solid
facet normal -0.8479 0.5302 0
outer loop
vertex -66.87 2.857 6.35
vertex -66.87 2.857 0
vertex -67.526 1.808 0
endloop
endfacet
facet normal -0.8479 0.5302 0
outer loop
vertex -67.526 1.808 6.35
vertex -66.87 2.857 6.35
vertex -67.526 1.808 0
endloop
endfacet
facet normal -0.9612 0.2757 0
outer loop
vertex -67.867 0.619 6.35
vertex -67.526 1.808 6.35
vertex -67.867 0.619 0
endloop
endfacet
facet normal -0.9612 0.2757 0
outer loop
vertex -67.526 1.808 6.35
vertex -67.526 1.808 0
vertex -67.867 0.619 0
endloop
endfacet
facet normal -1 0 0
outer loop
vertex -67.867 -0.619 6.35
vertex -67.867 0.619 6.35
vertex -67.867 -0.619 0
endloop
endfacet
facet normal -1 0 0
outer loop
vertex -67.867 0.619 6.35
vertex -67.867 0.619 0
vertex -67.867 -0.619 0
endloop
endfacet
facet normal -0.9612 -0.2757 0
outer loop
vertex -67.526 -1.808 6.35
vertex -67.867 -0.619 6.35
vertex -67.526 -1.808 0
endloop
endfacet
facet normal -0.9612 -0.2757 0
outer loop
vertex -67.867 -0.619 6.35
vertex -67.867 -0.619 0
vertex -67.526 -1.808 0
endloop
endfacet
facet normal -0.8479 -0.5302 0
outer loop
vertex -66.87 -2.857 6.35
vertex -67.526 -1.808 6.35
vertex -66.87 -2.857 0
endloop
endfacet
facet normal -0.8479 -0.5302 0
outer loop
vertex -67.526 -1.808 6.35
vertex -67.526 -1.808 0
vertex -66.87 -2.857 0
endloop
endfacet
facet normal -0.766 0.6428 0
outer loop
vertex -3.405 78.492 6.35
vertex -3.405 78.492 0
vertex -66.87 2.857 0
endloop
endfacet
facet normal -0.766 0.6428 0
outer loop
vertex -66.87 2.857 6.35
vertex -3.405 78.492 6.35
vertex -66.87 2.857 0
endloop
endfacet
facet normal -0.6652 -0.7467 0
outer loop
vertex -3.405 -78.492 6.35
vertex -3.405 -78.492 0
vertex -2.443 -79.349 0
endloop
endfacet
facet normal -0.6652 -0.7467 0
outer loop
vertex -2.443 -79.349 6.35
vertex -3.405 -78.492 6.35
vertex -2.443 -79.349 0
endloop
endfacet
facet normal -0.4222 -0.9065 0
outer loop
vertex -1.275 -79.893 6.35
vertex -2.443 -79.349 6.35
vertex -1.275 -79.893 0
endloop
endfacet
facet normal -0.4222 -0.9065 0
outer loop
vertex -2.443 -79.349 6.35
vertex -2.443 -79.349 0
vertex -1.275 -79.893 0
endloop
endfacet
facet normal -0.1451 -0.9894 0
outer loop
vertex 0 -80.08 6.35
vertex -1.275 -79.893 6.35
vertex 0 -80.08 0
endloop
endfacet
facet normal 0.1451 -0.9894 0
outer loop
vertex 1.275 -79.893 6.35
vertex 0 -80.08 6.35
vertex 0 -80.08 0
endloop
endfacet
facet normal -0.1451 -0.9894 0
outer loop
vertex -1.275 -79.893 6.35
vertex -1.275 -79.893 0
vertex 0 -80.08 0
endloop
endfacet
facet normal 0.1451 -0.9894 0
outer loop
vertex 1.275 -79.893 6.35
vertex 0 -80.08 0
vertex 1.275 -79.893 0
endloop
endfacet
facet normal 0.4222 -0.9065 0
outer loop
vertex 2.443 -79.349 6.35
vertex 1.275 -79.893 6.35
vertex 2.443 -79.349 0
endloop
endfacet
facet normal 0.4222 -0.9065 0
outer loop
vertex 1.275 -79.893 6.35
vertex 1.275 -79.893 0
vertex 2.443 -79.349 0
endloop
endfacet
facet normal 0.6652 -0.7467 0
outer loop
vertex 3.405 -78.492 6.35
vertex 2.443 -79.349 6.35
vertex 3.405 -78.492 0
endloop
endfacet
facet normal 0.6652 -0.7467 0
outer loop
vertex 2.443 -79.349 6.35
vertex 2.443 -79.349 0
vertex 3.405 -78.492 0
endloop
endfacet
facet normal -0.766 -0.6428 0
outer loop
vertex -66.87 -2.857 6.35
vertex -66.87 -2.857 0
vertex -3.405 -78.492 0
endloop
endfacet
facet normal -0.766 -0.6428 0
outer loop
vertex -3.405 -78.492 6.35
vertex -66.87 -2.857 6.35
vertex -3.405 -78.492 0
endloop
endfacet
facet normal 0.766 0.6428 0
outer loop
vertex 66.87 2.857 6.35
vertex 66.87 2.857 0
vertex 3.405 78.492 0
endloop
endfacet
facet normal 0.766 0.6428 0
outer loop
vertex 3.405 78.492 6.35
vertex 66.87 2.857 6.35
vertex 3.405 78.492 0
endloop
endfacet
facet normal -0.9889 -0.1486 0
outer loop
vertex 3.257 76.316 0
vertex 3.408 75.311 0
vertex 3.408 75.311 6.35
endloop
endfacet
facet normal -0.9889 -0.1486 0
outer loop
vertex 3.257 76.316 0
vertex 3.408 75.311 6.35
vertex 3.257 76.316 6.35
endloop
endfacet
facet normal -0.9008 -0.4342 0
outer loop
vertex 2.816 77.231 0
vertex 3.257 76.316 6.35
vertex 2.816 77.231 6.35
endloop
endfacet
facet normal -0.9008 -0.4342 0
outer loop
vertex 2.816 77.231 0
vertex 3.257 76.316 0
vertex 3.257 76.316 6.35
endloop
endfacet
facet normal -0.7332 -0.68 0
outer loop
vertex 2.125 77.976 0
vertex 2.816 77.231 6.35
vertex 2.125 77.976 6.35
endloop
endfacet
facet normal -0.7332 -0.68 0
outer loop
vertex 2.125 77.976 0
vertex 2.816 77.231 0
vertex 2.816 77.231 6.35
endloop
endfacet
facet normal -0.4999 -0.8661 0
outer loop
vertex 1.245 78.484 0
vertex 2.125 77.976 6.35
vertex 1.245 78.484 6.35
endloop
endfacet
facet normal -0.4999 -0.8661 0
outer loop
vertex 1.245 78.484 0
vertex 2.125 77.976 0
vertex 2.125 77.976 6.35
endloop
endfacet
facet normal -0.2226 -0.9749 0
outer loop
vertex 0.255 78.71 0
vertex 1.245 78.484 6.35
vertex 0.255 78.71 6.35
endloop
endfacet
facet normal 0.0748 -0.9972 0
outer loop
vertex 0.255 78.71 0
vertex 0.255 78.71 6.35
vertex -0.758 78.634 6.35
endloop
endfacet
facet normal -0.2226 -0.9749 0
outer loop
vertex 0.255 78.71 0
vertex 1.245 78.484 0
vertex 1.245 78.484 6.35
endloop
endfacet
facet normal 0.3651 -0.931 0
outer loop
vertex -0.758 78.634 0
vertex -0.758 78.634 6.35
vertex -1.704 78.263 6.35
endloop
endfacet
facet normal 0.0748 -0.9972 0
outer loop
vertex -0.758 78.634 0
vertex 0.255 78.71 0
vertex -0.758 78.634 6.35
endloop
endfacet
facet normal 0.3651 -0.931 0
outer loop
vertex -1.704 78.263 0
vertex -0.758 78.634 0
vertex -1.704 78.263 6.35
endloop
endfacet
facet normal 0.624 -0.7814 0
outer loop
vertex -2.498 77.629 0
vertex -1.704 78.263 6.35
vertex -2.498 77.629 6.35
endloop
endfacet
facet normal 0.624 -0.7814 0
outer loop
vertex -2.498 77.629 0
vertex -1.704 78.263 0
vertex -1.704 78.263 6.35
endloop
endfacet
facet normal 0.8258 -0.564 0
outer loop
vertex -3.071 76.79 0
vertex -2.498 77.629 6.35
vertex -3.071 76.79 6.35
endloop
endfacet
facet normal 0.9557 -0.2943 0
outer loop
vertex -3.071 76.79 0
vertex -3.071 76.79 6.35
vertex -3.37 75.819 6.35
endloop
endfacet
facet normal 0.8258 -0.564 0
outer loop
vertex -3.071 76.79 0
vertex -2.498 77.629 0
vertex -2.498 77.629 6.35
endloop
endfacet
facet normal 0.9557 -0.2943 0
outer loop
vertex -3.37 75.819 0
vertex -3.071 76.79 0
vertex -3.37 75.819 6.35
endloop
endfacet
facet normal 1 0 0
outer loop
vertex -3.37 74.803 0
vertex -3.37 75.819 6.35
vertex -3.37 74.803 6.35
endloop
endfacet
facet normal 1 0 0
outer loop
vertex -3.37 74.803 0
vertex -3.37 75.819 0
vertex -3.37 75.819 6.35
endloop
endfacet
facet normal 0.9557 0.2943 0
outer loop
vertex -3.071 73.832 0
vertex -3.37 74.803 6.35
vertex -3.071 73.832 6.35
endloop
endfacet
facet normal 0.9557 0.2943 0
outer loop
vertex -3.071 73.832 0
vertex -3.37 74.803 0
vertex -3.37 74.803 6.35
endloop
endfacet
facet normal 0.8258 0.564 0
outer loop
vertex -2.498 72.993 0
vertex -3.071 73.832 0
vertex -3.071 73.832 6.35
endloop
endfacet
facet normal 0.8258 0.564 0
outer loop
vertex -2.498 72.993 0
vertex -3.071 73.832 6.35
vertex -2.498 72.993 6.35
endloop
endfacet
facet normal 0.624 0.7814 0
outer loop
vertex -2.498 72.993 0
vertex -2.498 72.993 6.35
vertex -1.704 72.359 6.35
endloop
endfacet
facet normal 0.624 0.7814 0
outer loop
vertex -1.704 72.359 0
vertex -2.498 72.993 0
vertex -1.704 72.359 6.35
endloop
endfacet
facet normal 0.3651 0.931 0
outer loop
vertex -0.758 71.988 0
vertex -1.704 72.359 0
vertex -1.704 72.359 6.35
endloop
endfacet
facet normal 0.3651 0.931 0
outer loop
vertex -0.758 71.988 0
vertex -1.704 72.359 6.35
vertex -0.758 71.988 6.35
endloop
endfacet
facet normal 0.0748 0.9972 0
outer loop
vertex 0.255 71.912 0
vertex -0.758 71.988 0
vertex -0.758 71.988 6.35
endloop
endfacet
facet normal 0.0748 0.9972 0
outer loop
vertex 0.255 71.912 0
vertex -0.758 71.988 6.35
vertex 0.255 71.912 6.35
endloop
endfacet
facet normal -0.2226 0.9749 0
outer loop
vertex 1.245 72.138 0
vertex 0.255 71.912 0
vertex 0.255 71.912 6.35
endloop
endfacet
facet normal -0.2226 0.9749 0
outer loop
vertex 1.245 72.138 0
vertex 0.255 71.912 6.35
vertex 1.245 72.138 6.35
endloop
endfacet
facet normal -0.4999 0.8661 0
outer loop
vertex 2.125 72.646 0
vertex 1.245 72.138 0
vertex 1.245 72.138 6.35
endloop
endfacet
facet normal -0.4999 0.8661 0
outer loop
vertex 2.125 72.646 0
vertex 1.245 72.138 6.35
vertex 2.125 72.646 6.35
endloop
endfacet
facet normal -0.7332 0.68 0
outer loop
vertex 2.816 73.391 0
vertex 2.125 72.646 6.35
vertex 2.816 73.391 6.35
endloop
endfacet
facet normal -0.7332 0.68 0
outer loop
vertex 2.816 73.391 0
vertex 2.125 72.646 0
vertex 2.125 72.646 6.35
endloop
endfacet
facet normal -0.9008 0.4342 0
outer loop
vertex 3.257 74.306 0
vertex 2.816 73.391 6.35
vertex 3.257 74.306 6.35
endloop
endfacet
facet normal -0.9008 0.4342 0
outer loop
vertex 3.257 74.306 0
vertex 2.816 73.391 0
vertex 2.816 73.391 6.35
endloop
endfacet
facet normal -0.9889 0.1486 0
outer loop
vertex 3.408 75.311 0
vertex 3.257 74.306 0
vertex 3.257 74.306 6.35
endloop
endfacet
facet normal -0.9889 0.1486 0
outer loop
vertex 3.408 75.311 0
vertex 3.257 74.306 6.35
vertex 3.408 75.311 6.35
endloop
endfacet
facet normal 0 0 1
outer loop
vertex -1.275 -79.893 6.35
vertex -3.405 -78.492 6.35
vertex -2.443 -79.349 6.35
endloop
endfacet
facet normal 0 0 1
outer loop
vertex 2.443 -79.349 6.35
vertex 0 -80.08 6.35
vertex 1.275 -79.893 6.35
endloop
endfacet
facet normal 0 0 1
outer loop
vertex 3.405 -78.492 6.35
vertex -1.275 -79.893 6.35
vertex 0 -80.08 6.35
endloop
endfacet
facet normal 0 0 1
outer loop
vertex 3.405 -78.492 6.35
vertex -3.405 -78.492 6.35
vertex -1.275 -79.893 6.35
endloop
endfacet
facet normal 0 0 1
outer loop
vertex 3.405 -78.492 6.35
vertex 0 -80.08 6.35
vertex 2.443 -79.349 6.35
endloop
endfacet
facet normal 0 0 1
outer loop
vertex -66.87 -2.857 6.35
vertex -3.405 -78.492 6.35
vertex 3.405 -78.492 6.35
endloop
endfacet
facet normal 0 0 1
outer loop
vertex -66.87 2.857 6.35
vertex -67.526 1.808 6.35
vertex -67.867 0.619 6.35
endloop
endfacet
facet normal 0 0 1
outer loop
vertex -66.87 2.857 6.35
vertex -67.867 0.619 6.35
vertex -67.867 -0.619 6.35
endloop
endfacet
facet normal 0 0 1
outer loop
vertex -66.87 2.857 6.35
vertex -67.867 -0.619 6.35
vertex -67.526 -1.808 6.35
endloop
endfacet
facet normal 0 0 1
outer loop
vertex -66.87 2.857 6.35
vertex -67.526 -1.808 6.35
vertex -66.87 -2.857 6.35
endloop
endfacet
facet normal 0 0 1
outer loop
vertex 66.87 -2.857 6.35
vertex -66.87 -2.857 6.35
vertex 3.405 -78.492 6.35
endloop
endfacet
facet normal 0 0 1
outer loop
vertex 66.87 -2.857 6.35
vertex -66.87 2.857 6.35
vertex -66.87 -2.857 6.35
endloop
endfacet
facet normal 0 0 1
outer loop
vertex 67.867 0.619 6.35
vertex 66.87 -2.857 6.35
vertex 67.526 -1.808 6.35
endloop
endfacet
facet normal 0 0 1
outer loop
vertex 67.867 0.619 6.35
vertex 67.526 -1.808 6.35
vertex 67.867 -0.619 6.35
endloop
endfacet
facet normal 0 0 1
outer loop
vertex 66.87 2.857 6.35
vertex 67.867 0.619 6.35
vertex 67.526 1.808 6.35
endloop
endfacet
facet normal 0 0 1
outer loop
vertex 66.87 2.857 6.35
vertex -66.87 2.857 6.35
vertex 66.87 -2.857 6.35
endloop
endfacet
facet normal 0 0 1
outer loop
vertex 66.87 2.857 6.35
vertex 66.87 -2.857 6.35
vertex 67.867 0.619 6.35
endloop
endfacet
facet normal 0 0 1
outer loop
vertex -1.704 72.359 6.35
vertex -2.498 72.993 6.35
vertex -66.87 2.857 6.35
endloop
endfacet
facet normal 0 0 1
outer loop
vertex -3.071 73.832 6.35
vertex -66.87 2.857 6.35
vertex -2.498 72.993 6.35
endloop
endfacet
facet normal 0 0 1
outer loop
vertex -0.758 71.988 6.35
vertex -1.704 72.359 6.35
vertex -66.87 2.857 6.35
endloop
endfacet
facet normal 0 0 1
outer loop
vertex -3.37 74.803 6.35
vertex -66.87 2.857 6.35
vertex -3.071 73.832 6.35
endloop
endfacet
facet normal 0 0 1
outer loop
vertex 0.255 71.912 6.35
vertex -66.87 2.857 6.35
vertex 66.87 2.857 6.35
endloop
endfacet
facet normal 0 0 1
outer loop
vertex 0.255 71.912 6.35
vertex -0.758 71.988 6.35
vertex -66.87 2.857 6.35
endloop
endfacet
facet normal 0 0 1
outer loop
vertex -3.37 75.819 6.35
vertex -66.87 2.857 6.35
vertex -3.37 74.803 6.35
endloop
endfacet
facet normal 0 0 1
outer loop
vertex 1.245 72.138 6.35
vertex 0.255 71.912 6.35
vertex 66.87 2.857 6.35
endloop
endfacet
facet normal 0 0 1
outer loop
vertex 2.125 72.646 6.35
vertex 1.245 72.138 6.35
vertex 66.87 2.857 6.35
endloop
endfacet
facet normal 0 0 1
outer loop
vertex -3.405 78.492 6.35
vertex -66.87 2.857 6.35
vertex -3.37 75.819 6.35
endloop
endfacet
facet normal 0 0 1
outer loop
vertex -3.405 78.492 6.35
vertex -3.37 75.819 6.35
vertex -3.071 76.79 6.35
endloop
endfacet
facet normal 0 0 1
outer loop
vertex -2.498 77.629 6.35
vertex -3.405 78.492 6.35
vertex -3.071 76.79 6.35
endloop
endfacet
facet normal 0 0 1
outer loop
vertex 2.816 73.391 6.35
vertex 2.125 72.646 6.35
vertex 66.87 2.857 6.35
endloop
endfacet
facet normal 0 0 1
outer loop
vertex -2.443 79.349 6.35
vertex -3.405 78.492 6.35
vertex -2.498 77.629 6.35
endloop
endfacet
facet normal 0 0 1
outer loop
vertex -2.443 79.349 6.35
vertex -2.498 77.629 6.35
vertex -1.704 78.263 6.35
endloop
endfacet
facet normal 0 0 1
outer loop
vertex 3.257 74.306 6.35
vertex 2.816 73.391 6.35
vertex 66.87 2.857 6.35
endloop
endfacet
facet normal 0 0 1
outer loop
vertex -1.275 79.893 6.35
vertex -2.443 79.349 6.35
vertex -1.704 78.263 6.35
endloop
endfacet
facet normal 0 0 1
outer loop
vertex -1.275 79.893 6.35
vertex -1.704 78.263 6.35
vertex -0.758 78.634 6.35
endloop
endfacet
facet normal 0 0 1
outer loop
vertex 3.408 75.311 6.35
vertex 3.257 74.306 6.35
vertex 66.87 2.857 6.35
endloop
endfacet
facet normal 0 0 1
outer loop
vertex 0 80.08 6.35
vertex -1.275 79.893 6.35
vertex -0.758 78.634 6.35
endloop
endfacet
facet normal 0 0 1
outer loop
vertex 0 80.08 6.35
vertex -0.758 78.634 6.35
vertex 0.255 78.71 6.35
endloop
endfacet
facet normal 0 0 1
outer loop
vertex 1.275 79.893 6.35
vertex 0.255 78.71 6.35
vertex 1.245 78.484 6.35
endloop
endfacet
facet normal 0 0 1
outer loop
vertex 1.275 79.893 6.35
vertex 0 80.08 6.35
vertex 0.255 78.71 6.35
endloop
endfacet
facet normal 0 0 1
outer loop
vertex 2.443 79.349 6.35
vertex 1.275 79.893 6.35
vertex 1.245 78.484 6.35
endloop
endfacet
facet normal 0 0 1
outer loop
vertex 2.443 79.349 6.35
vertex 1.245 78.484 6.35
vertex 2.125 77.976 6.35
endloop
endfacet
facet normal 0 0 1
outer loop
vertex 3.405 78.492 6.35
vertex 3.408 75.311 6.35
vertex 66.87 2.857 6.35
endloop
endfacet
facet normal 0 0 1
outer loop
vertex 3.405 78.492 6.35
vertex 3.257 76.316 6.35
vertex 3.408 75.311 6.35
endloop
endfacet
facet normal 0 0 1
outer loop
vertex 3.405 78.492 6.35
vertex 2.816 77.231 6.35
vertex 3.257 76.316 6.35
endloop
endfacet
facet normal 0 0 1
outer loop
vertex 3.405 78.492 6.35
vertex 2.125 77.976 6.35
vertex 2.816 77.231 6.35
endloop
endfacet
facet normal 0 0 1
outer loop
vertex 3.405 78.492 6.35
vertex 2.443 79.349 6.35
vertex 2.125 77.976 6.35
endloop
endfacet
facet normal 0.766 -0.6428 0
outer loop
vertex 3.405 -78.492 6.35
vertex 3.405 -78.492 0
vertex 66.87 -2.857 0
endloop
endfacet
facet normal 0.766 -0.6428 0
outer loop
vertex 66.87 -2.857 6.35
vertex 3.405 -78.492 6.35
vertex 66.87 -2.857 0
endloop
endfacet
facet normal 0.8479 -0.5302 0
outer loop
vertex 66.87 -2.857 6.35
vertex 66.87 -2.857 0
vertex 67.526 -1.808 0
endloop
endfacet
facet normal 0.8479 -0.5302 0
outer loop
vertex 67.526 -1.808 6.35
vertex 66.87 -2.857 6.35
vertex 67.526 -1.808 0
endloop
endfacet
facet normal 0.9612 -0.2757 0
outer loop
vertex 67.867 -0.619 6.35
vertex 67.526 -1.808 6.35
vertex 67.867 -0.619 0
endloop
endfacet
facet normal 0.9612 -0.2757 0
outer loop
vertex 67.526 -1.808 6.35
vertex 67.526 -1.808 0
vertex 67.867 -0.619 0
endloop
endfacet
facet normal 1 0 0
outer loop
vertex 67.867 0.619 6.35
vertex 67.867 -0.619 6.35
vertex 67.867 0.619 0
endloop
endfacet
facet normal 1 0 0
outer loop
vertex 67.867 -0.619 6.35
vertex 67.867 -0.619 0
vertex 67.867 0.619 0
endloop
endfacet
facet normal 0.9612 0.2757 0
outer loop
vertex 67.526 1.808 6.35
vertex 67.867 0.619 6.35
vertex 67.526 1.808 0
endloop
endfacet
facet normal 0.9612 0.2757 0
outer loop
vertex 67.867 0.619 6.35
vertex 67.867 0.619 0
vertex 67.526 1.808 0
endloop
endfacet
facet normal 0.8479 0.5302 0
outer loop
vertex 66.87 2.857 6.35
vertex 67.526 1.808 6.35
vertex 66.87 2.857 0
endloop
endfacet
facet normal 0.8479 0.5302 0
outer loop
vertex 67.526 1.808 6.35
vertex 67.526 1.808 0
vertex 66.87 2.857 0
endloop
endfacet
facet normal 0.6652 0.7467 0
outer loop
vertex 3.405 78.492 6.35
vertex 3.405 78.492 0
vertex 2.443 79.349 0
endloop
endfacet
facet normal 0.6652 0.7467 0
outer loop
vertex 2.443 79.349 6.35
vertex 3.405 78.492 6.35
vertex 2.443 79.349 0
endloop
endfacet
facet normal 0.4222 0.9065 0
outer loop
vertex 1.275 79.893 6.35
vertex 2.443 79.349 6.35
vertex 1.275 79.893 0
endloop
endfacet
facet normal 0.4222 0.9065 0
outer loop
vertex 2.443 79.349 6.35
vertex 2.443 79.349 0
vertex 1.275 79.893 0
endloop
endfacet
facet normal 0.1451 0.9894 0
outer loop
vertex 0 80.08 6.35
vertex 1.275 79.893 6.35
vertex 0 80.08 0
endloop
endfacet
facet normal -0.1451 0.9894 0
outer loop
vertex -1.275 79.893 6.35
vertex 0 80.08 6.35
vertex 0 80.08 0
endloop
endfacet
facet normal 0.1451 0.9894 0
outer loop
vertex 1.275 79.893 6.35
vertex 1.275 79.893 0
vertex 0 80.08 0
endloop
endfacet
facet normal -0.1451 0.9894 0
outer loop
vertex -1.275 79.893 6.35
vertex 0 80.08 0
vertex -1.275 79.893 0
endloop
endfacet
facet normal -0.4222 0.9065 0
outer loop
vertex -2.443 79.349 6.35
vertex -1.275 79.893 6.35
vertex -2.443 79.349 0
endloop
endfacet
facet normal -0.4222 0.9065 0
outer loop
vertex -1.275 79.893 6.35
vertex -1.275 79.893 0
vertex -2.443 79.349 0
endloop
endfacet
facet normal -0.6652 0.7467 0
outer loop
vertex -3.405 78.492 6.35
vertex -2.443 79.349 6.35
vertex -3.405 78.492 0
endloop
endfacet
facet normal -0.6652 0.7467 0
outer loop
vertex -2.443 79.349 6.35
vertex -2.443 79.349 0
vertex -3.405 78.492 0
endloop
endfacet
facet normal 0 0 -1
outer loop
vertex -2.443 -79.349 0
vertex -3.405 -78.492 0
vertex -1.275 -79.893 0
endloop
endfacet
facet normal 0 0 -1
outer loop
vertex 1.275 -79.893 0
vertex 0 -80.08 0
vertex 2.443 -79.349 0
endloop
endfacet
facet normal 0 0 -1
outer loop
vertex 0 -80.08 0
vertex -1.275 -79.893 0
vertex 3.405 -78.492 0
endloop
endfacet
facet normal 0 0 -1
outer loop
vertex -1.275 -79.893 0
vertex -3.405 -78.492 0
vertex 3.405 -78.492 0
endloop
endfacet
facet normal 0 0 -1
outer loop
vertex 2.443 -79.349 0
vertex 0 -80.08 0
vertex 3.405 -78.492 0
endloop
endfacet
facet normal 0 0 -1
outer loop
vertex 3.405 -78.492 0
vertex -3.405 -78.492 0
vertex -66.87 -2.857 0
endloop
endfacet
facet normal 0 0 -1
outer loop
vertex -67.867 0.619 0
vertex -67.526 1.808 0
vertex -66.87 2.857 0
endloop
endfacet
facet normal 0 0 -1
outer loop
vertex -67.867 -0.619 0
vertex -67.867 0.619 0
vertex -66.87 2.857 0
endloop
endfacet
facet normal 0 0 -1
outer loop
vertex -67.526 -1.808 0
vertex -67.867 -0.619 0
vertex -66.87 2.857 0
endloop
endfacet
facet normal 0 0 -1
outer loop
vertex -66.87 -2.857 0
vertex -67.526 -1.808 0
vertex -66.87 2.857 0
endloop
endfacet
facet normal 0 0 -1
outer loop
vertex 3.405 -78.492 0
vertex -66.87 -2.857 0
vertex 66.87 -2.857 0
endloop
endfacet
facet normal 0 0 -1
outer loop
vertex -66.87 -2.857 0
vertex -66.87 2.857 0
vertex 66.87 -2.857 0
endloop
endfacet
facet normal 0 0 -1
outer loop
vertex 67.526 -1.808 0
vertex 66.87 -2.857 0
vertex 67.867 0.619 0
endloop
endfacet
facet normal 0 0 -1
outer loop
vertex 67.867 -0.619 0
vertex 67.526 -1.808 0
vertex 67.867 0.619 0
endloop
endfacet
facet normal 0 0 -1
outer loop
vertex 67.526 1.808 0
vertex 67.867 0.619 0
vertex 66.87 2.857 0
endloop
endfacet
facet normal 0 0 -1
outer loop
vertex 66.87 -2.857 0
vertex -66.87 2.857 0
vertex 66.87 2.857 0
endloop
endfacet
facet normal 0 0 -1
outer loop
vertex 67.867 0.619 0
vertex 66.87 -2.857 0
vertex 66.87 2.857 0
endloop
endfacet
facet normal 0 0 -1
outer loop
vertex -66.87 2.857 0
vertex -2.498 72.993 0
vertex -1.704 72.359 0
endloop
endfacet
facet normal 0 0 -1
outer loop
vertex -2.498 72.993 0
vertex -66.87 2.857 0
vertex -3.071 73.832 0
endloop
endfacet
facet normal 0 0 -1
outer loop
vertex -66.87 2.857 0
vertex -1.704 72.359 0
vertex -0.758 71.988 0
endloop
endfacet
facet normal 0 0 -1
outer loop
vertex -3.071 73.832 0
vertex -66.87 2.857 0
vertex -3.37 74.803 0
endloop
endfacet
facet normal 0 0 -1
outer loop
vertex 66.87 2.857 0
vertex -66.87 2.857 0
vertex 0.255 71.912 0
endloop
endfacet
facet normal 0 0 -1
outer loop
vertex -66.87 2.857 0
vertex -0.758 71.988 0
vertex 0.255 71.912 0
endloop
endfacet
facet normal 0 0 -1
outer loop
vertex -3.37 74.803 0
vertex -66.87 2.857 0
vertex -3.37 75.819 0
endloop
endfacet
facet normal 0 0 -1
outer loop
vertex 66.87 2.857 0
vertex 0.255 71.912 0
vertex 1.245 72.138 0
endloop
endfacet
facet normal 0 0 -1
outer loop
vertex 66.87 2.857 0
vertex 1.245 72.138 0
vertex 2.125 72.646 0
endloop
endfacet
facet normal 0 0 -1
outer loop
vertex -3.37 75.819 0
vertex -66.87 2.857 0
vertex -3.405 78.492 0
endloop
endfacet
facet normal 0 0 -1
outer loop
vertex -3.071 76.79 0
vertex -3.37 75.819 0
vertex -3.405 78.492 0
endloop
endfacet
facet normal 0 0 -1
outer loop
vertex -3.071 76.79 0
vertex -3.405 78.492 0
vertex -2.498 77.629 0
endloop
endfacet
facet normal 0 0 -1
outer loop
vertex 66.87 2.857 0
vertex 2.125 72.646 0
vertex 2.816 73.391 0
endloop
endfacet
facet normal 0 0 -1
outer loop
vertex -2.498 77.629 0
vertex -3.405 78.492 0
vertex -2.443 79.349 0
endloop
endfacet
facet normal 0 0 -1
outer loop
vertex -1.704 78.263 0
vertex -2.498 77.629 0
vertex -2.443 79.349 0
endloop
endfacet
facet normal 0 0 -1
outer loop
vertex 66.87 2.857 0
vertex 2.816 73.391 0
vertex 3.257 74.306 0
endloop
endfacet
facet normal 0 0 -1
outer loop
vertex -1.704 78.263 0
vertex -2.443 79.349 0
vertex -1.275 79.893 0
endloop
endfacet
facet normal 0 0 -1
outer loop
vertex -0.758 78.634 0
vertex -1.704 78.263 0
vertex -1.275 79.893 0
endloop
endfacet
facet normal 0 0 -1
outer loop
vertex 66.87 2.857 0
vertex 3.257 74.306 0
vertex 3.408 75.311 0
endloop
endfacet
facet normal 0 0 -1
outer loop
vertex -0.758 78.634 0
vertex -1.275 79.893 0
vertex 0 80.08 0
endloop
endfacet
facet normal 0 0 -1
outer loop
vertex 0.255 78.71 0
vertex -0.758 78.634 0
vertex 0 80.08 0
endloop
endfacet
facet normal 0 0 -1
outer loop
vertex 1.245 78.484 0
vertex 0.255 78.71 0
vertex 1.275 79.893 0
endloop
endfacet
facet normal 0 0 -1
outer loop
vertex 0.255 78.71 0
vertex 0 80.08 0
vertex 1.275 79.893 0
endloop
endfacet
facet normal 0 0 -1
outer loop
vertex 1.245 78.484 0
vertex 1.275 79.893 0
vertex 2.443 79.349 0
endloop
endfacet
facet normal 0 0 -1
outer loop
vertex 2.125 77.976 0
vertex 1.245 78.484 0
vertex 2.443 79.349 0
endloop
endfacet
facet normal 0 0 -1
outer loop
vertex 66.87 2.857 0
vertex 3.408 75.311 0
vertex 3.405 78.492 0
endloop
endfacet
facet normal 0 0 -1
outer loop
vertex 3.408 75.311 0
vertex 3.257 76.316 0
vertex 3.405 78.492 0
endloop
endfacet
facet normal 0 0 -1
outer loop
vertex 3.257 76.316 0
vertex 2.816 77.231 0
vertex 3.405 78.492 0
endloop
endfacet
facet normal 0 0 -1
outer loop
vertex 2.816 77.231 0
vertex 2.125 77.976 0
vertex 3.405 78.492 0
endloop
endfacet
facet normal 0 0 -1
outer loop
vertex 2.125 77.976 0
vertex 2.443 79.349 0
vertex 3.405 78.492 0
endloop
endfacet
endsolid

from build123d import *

# Parameters (mm, degrees)
F0_R     = 3.40817912
F1_DEPTH = 6.35


# Not quite as in the source:
# - a length typed as a fraction of an inch, garbled in the dataset ("3 / 203.2 mm" for 3/8 in), is restored


with BuildPart() as f1:
    # F0 (on Top) → F1 (new body)
    with BuildSketch(Plane.XY):
        with BuildLine():
            ThreePointArc((3.4050675497, 78.4919985147), (0, 80.0798075896), (-3.4050675497, 78.4919985147))
            Line((-3.4050675497, 78.4919985147), (-66.8702067023, 2.8571909251))
            ThreePointArc((-66.8702067023, 2.8571909251), (-67.9101391526, 0), (-66.8702067023, -2.8571909251))
            Line((-66.8702067023, -2.8571909251), (-3.4050675497, -78.4919985147))
            ThreePointArc((-3.4050675497, -78.4919985147), (0, -80.0798075896), (3.4050675497, -78.4919985147))
            Line((3.4050675497, -78.4919985147), (66.8702067023, -2.8571909251))
            ThreePointArc((66.8702067023, -2.8571909251), (67.9101391526, 0), (66.8702067023, 2.8571909251))
            Line((66.8702067023, 2.8571909251), (3.4050675497, 78.4919985147))
        make_face()
        with Locations((0, 75.311)):
            Circle(F0_R, mode=Mode.SUBTRACT)
    extrude(amount=F1_DEPTH)


solid = f1.part
